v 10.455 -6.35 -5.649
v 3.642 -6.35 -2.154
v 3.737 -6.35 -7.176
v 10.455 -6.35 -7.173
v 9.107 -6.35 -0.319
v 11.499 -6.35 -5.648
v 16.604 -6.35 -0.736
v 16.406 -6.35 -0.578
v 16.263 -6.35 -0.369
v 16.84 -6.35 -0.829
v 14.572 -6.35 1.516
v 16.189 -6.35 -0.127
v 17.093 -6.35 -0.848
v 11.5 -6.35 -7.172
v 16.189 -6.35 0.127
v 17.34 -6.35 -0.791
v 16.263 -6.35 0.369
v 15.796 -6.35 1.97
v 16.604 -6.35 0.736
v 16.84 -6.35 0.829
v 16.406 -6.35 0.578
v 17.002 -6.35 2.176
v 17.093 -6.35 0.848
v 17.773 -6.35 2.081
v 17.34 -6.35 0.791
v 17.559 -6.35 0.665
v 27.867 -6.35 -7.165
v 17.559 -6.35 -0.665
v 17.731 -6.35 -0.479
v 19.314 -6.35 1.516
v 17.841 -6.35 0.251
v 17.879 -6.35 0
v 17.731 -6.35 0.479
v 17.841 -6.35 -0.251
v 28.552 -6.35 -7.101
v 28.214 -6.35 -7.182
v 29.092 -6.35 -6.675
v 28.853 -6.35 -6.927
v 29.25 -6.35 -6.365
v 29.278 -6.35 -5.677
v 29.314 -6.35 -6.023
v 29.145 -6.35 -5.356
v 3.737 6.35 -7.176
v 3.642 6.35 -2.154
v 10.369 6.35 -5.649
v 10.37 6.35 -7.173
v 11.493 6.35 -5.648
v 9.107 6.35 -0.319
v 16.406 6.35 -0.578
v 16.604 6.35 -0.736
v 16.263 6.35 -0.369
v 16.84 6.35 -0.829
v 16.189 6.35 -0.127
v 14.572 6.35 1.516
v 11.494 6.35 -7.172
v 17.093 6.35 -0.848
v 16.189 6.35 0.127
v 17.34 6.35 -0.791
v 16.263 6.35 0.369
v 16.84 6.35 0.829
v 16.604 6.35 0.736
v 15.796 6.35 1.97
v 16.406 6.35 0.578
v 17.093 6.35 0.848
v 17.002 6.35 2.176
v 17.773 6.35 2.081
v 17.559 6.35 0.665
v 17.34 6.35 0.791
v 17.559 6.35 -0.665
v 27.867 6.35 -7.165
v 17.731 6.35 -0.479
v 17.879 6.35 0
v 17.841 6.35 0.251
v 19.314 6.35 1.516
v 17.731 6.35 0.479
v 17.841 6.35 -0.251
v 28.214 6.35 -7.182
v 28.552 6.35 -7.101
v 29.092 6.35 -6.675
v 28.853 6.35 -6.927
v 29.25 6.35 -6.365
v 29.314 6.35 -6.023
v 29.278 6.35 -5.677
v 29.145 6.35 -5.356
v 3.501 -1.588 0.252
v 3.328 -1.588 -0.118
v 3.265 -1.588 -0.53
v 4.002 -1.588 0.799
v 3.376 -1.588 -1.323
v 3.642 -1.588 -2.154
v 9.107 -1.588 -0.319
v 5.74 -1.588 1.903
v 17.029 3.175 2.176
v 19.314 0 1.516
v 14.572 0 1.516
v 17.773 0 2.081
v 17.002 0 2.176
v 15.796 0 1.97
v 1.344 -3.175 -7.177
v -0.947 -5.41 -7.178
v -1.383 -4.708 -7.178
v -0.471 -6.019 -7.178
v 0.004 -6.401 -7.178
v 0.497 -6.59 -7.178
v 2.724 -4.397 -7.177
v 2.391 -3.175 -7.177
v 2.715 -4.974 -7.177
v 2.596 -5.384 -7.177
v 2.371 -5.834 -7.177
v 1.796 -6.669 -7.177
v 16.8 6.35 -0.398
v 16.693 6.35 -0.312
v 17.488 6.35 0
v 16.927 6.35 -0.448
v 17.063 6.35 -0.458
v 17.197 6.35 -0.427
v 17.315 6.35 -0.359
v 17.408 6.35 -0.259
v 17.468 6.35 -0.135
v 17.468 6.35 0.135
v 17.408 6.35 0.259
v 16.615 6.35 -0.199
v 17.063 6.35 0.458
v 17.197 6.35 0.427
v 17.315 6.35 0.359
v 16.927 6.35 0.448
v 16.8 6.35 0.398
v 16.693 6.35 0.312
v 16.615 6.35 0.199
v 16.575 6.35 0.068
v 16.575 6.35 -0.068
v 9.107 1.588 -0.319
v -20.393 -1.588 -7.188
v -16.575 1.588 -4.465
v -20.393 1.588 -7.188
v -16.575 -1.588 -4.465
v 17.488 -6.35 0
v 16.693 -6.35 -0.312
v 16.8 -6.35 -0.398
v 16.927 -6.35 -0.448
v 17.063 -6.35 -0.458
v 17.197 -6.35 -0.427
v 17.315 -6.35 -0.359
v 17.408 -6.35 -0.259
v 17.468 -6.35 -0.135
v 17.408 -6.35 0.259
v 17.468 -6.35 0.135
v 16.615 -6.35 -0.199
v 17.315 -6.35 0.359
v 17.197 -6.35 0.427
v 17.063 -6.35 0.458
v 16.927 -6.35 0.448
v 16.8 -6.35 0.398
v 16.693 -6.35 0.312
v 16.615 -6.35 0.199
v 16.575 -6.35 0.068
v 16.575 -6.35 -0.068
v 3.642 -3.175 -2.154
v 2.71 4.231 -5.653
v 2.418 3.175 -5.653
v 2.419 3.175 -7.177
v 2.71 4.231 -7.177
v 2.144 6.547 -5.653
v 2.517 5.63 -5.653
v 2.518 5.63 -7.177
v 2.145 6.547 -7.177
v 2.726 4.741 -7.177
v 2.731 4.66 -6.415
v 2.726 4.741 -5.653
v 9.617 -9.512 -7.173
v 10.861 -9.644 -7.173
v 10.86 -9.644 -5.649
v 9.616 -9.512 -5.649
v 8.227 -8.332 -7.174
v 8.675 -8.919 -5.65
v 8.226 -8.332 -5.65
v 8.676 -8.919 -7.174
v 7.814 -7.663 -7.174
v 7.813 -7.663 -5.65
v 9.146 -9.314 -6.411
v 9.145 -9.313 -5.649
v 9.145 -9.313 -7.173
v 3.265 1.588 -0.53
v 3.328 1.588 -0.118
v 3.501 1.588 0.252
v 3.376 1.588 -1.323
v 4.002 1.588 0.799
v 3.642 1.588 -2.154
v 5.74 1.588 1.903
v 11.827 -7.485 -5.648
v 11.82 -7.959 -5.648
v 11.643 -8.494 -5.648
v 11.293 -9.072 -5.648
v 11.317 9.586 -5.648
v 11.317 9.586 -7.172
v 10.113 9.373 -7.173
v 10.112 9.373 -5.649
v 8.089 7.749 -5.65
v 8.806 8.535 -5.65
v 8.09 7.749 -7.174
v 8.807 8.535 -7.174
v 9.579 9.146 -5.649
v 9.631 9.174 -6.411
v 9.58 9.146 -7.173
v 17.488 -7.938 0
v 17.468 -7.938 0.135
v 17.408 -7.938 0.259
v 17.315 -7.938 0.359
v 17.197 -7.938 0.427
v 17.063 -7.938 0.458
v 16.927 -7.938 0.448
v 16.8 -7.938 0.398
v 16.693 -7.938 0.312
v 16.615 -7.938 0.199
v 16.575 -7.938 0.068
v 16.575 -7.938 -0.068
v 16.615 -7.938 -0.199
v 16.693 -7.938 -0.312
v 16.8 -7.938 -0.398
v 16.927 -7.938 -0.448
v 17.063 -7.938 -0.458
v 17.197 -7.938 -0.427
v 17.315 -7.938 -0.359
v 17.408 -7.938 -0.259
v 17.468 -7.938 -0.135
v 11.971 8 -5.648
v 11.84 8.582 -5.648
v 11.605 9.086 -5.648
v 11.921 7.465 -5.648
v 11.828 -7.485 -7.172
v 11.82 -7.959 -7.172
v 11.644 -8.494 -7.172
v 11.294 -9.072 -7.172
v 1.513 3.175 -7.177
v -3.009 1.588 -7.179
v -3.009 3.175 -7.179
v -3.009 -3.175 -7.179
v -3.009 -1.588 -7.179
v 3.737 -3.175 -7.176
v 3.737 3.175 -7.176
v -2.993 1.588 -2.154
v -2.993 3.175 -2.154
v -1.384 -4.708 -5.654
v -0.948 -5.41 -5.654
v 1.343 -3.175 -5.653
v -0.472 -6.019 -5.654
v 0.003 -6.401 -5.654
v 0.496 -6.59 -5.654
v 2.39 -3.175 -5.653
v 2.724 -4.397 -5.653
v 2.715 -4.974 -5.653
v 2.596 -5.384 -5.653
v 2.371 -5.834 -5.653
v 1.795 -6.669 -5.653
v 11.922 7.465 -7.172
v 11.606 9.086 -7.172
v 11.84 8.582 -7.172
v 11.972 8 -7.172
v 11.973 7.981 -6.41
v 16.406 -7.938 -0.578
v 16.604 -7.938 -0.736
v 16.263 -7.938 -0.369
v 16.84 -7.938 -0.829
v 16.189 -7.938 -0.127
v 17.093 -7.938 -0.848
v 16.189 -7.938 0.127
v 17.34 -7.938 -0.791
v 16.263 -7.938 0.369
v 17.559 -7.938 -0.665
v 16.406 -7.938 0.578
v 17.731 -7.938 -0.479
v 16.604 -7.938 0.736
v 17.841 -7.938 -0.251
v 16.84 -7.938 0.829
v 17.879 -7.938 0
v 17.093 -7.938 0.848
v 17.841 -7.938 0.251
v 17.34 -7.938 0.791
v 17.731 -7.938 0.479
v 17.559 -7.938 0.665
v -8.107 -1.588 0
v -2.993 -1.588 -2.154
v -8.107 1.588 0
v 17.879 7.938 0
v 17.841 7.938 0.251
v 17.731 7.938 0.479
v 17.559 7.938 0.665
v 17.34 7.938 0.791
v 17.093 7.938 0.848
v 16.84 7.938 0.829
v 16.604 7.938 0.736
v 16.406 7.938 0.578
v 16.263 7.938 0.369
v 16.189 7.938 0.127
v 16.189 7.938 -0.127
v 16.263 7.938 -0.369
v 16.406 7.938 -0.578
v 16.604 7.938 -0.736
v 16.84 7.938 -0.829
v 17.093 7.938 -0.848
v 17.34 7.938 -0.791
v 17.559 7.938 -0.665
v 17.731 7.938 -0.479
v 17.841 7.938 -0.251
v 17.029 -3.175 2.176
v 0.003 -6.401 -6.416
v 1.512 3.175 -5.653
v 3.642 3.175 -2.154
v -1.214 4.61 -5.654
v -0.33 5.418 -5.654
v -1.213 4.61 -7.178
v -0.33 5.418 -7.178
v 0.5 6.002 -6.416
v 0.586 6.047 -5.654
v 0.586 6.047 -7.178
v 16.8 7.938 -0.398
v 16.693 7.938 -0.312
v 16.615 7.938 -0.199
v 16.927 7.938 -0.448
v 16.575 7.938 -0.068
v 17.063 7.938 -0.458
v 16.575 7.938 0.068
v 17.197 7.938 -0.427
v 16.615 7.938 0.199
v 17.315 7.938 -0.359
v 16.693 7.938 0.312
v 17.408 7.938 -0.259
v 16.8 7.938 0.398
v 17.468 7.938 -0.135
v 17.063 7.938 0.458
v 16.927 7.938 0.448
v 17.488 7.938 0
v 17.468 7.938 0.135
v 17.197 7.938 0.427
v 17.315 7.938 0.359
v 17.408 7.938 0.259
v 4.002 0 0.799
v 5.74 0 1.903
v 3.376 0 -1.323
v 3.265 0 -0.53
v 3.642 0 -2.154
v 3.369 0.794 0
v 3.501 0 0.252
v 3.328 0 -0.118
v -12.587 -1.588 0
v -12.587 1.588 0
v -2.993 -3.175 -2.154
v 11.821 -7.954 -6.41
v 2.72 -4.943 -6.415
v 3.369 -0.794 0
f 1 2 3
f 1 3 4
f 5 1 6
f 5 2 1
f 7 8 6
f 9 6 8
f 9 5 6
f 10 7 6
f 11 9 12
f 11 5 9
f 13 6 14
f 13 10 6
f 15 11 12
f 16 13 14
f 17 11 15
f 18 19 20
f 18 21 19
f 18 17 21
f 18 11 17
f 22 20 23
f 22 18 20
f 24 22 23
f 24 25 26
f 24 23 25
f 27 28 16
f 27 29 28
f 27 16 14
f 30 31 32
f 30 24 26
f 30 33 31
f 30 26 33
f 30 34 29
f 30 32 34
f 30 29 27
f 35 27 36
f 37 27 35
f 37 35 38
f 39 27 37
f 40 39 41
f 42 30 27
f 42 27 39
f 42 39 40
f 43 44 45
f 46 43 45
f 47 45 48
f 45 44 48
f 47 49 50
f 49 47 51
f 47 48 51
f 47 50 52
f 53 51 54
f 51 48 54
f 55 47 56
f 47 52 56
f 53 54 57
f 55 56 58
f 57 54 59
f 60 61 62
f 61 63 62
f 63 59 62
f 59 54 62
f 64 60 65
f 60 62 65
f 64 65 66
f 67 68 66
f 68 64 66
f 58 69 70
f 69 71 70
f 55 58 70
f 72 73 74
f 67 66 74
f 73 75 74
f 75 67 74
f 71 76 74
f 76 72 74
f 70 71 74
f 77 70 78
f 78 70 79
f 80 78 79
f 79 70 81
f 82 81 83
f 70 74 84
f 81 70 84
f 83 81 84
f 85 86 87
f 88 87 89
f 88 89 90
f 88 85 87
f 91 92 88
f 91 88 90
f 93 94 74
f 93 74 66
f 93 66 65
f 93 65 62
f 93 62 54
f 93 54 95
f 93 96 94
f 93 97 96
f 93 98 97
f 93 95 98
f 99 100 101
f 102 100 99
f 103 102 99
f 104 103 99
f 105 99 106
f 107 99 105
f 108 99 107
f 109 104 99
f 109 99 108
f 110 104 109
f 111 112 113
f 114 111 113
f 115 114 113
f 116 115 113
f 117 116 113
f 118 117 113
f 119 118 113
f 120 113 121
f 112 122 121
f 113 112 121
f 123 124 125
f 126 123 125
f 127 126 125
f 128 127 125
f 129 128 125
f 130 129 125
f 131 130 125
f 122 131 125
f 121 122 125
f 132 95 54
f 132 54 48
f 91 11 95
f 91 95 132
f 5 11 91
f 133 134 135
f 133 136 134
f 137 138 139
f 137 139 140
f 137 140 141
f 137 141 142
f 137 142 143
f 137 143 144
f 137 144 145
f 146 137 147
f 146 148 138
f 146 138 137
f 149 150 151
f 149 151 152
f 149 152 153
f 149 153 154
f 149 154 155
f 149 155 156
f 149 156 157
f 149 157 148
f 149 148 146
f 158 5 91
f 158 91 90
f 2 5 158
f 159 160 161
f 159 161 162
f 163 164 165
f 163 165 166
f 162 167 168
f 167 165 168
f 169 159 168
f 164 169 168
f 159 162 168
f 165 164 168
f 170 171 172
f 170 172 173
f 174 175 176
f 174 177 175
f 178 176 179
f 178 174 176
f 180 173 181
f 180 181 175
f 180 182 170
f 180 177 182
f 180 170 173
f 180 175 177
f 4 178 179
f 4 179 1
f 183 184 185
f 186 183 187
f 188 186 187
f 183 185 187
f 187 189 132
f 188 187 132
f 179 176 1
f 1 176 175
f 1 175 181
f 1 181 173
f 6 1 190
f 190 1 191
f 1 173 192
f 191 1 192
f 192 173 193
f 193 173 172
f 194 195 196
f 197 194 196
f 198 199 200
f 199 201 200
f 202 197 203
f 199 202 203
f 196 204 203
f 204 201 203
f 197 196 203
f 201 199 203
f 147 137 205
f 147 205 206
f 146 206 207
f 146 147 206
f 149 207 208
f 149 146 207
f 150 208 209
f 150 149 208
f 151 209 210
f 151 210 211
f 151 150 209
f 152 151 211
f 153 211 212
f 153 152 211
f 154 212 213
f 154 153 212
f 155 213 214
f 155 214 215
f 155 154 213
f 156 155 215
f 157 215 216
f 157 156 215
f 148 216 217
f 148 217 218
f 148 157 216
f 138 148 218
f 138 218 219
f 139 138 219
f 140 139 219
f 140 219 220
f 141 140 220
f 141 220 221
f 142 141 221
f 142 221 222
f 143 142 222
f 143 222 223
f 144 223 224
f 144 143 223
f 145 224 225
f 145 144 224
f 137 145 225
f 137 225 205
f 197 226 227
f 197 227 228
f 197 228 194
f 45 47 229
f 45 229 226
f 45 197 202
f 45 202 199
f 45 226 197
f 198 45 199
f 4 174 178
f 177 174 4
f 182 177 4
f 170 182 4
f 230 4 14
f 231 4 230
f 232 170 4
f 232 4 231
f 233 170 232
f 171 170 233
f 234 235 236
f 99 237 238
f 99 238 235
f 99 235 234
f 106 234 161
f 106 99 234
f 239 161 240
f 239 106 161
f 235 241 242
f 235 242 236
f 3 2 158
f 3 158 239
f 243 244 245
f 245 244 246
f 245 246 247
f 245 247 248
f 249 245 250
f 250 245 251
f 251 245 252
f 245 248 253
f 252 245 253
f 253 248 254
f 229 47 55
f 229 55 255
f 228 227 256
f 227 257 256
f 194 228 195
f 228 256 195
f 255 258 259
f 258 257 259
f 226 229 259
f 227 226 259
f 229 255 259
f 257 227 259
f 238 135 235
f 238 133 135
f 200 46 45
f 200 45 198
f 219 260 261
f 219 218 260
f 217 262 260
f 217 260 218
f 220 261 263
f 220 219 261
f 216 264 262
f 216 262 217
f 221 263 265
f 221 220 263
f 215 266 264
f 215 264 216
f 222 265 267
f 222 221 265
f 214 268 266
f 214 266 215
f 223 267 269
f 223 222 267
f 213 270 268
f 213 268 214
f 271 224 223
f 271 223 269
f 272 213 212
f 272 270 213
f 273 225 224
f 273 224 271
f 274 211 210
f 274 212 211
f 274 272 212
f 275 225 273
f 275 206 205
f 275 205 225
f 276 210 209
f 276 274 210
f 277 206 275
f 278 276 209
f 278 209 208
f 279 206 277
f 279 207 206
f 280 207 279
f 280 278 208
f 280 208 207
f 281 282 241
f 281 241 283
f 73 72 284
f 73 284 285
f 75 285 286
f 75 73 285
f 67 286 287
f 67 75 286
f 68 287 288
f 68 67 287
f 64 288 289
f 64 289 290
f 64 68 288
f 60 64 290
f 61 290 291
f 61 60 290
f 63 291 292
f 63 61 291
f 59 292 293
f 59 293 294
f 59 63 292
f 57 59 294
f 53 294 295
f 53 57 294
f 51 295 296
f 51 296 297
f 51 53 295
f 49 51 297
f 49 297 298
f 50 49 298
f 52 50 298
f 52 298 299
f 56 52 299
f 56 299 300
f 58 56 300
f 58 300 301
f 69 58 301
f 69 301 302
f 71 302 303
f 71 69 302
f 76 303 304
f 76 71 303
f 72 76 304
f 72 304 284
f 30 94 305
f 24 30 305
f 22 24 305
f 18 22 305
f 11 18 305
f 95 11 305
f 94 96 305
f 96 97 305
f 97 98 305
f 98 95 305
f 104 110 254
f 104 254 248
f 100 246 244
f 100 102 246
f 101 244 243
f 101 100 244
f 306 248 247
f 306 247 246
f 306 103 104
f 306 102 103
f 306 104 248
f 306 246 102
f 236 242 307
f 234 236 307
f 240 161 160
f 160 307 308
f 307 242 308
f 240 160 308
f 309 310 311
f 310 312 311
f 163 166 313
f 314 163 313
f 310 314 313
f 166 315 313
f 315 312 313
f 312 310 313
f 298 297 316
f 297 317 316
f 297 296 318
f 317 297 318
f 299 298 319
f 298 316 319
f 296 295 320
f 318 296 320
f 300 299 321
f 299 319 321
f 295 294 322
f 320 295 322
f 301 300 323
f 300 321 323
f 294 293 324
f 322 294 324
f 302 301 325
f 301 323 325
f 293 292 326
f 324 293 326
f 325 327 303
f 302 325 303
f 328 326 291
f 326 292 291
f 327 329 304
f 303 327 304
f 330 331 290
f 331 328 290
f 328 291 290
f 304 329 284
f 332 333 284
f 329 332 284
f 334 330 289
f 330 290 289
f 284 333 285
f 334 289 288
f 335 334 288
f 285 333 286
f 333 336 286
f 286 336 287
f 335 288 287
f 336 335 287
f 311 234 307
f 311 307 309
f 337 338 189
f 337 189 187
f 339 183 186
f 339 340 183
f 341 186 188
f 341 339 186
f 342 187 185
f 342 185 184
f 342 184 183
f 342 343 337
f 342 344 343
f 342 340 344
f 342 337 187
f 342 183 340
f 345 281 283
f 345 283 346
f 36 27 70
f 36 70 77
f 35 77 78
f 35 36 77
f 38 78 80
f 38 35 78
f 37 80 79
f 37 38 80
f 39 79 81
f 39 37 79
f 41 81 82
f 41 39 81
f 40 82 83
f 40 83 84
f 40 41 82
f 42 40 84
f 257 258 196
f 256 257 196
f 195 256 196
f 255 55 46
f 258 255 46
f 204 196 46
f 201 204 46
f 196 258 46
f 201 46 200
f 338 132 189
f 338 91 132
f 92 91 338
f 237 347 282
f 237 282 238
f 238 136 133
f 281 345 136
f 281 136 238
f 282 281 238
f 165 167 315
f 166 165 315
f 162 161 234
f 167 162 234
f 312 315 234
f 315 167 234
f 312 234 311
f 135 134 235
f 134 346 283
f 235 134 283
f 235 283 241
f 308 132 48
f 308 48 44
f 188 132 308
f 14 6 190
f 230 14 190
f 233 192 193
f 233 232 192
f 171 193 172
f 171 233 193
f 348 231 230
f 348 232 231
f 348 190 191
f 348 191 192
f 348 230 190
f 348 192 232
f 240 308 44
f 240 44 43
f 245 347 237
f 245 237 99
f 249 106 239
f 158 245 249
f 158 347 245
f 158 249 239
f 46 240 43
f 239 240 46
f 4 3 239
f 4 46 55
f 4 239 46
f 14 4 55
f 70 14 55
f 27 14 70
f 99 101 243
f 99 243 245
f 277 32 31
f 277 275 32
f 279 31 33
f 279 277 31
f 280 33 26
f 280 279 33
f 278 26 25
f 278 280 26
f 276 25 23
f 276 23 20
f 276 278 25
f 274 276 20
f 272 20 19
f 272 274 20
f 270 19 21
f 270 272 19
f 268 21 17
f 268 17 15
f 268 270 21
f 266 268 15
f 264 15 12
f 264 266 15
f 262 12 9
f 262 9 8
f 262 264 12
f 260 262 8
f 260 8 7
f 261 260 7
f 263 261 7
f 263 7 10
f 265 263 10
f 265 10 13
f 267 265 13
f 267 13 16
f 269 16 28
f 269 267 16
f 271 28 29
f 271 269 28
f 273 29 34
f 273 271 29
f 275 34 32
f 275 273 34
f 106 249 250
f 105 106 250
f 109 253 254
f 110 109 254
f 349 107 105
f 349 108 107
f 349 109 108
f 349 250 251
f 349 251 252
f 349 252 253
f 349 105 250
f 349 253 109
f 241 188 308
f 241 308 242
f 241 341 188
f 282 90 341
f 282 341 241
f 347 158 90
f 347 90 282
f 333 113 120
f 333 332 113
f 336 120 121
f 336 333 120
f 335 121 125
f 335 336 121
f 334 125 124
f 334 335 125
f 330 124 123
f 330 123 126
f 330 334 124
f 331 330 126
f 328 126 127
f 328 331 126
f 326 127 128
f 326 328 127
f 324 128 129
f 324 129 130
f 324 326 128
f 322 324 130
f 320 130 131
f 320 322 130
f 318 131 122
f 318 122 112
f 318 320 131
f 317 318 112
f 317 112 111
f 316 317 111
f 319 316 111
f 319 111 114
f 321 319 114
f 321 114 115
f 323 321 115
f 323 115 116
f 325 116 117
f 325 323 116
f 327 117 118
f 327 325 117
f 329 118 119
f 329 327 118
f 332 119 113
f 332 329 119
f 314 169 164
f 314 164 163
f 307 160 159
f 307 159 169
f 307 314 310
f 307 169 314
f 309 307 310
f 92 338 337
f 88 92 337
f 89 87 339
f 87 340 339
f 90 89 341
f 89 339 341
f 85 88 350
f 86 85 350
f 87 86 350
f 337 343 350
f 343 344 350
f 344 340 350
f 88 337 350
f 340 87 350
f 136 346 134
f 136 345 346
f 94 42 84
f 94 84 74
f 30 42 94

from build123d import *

# Parameters (mm, degrees)
F0_R     = 0.8499357061
F1_DEPTH = 6.35
F2_DEPTH = 3.175
F3_DEPTH = 1.5875
F4_DEPTH = 1.5875
F0_R_2   = 0.4591365961
F5_DEPTH = 7.9375
F6_DEPTH = 6.35
F9_DEPTH = 1.524


with BuildPart() as f1:
    # F0 (on Front) → F1 (new body, symmetric)
    with BuildSketch(Plane.XZ):
        with BuildLine():
            Line((3.7369009076, -7.1760629105), (27.8668981838, -7.1645976751))
            ThreePointArc((27.8668981838, -7.1645976751), (29.0924289966, -6.6745059956), (29.1452982829, -5.3556730016))
            Line((29.1452982829, -5.3556730016), (19.3140551537, 1.5164437805))
            add(Edge.make_bspline(
                [(19.3140551537, 1.5164437805), (18.5598178705, 1.842624393), (17.0255294285, 2.5061492361), (15.3991179845, 1.8500253214), (14.5722303488, 1.5164437805)],
                knots=[0, 0, 0, 0, 0.4915876753, 1, 1, 1, 1], degree=3))
            Line((14.5722303488, 1.5164437805), (9.1069049254, -0.31865054))
            Line((9.1069049254, -0.31865054), (3.641579502, -2.1537448606))
            Line((3.641579502, -2.1537448606), (3.7369009076, -7.1760629105))
        make_face()
        with Locations((17.0290809923, 0)):
            Circle(F0_R, mode=Mode.SUBTRACT)
    extrude(amount=F1_DEPTH, both=True)

    # F0 (on Front) → F2 (join, symmetric)
    with BuildSketch(Plane.XZ):
        Polygon((-3.0088014841, -7.1792680938), (3.7369009076, -7.1760629105), (3.641579502, -2.1537448606), (-2.9932308073, -2.1537448606), align=None)
    extrude(amount=F2_DEPTH, both=True)

    # F0 (on Front) → F3 (join, symmetric)
    with BuildSketch(Plane.XZ):
        Polygon((-20.3930963686, -7.1875281459), (-3.0088014841, -7.1792680938), (-2.9932308073, -2.1537448606), (-8.1067462721, 0), (-12.5872229892, 0), (-16.5754726262, -4.4647546742), align=None)
    extrude(amount=F3_DEPTH, both=True)

    # F0 (on Front) → F4 (join, symmetric)
    with BuildSketch(Plane.XZ):
        with BuildLine():
            add(Edge.make_bspline(
                [(5.739697431, 1.9025673836), (4.7061257381, 1.3267304785), (2.7990985393, 0.2642627845), (3.3769243884, -1.3941566443), (3.641579502, -2.1537448606)],
                knots=[0, 0, 0, 0, 0.5419806321, 1, 1, 1, 1], degree=3))
            Line((3.641579502, -2.1537448606), (9.1069049254, -0.31865054))
            Line((9.1069049254, -0.31865054), (5.739697431, 1.9025673836))
        make_face()
    extrude(amount=F4_DEPTH, both=True)

    # F0 (on Front) → F5 (join, symmetric)
    with BuildSketch(Plane.XZ):
        with Locations((17.0290809923, 0)):
            Circle(F0_R)
        with Locations((17.0290809923, 0)):
            Circle(F0_R_2, mode=Mode.SUBTRACT)
    extrude(amount=F5_DEPTH, both=True)

    # F0 (on Front) → F6 (join, symmetric)
    with BuildSketch(Plane.XZ):
        with Locations((17.0290809923, 0)):
            Circle(F0_R_2)
    extrude(amount=F6_DEPTH, both=True)

    # F8 (on offset) → F9 (join)
    with BuildSketch(Plane(origin=(0.0034105097, 0, -7.1778368579), x_dir=(0.9999998871, 0, 0.0004751444), z_dir=(0.0004751444, 0, -0.9999998871))):
        with BuildLine():
            Line((10.5719827116, 6.2902872451), (11.4731285721, 6.2886215746))
            add(Edge.make_bspline(
                [(11.4731285721, 6.2886215746), (11.6881530578, 6.8505612185), (12.1330545046, 8.0132553954), (11.2921062686, 9.0884414112), (10.8575951308, 9.6439812332)],
                knots=[0, 0, 0, 0, 0.483308128, 1, 1, 1, 1], degree=3))
            add(Edge.make_bspline(
                [(10.8575951308, 9.6439812332), (10.2459421425, 9.6264263255), (8.9601619026, 9.5895234992), (8.2060067921, 8.3258092197), (7.8106075525, 7.6632509008)],
                knots=[0, 0, 0, 0, 0.4757056489, 1, 1, 1, 1], degree=3))
            Line((7.8106075525, 7.6632509008), (10.5719827116, 6.2902872451))
        make_face()
        with BuildLine():
            add(Edge.make_bspline(
                [(11.445928365, -6.2551540323), (11.7208028901, -6.8377598255), (12.2652189582, -7.9916679237), (11.6289449799, -9.0578690758), (11.3139245659, -9.5857474953)],
                knots=[0, 0, 0, 0, 0.5048979368, 1, 1, 1, 1], degree=3))
            Line((11.445928365, -6.2551540323), (10.5652892962, -6.2281796709))
            Line((10.5652892962, -6.2281796709), (8.0862324685, -7.7491207048))
            add(Edge.make_bspline(
                [(11.3139245659, -9.5857474953), (10.7293926361, -9.5187590976), (9.5019236971, -9.3780889543), (8.572864944, -8.3090653448), (8.0862324685, -7.7491207048)],
                knots=[0, 0, 0, 0, 0.4762091973, 1, 1, 1, 1], degree=3))
        make_face()
        with BuildLine():
            add(Edge.make_bspline(
                [(2.4012238719, -3.135364037), (2.5766554897, -3.6317241258), (2.9495824062, -4.6868706955), (2.4212189682, -5.9031792319), (2.1414074581, -6.5473141149)],
                knots=[0, 0, 0, 0, 0.4704182467, 1, 1, 1, 1], degree=3))
            Line((2.4012238719, -3.135364037), (1.5678445343, -3.1441783067))
            Line((1.5678445343, -3.1441783067), (-1.2165163644, -4.6103880741))
            add(Edge.make_bspline(
                [(2.1414074581, -6.5473141149), (1.5835583581, -6.4193566225), (0.3958954029, -6.1469346133), (-0.6577640532, -5.1428505543), (-1.2165163644, -4.6103880741)],
                knots=[0, 0, 0, 0, 0.4697032587, 1, 1, 1, 1], degree=3))
        make_face()
        with BuildLine():
            Line((1.3515800238, 3.1687226146), (2.3737214506, 3.1360480934))
            add(Edge.make_bspline(
                [(2.3737214506, 3.1360480934), (2.5897819708, 3.7493472374), (3.0287531003, 4.9953902449), (2.2088825996, 6.1050612637), (1.792550087, 6.6685550846)],
                knots=[0, 0, 0, 0, 0.4921974706, 1, 1, 1, 1], degree=3))
            add(Edge.make_bspline(
                [(1.792550087, 6.6685550846), (1.1529153889, 6.6804914863), (-0.1895757498, 6.7055440354), (-0.9754613011, 5.3946395707), (-1.3869088143, 4.7083199024)],
                knots=[0, 0, 0, 0, 0.4764535334, 1, 1, 1, 1], degree=3))
            Line((-1.3869088143, 4.7083199024), (1.3515800238, 3.1687226146))
        make_face()
    extrude(amount=-F9_DEPTH)


solid = f1.part
